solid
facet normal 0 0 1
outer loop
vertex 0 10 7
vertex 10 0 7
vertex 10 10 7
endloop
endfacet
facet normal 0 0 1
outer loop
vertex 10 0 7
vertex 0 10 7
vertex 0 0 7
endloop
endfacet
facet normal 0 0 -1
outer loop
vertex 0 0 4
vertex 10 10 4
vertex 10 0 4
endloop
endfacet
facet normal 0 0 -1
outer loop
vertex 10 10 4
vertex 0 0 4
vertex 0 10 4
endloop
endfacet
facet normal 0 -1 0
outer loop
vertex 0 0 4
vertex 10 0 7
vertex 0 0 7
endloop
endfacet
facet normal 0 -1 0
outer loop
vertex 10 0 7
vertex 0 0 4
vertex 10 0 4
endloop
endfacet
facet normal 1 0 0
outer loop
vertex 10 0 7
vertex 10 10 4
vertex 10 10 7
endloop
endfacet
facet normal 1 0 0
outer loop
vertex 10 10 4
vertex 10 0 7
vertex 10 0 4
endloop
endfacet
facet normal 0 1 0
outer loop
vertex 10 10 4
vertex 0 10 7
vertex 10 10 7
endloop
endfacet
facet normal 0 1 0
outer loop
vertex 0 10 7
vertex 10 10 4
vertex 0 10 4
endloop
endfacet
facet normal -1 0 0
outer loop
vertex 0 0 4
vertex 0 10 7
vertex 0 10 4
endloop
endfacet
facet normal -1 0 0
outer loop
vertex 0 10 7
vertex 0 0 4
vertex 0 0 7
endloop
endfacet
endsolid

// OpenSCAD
// arm body's own scad: the only place the angle echo lives (AC-A3). A = tilt in degrees.
A = is_undef(A) ? 0 : A;
echo(ARM_TILT = A);
translate([0, 0, 4]) cube([10, 10, 3]);
